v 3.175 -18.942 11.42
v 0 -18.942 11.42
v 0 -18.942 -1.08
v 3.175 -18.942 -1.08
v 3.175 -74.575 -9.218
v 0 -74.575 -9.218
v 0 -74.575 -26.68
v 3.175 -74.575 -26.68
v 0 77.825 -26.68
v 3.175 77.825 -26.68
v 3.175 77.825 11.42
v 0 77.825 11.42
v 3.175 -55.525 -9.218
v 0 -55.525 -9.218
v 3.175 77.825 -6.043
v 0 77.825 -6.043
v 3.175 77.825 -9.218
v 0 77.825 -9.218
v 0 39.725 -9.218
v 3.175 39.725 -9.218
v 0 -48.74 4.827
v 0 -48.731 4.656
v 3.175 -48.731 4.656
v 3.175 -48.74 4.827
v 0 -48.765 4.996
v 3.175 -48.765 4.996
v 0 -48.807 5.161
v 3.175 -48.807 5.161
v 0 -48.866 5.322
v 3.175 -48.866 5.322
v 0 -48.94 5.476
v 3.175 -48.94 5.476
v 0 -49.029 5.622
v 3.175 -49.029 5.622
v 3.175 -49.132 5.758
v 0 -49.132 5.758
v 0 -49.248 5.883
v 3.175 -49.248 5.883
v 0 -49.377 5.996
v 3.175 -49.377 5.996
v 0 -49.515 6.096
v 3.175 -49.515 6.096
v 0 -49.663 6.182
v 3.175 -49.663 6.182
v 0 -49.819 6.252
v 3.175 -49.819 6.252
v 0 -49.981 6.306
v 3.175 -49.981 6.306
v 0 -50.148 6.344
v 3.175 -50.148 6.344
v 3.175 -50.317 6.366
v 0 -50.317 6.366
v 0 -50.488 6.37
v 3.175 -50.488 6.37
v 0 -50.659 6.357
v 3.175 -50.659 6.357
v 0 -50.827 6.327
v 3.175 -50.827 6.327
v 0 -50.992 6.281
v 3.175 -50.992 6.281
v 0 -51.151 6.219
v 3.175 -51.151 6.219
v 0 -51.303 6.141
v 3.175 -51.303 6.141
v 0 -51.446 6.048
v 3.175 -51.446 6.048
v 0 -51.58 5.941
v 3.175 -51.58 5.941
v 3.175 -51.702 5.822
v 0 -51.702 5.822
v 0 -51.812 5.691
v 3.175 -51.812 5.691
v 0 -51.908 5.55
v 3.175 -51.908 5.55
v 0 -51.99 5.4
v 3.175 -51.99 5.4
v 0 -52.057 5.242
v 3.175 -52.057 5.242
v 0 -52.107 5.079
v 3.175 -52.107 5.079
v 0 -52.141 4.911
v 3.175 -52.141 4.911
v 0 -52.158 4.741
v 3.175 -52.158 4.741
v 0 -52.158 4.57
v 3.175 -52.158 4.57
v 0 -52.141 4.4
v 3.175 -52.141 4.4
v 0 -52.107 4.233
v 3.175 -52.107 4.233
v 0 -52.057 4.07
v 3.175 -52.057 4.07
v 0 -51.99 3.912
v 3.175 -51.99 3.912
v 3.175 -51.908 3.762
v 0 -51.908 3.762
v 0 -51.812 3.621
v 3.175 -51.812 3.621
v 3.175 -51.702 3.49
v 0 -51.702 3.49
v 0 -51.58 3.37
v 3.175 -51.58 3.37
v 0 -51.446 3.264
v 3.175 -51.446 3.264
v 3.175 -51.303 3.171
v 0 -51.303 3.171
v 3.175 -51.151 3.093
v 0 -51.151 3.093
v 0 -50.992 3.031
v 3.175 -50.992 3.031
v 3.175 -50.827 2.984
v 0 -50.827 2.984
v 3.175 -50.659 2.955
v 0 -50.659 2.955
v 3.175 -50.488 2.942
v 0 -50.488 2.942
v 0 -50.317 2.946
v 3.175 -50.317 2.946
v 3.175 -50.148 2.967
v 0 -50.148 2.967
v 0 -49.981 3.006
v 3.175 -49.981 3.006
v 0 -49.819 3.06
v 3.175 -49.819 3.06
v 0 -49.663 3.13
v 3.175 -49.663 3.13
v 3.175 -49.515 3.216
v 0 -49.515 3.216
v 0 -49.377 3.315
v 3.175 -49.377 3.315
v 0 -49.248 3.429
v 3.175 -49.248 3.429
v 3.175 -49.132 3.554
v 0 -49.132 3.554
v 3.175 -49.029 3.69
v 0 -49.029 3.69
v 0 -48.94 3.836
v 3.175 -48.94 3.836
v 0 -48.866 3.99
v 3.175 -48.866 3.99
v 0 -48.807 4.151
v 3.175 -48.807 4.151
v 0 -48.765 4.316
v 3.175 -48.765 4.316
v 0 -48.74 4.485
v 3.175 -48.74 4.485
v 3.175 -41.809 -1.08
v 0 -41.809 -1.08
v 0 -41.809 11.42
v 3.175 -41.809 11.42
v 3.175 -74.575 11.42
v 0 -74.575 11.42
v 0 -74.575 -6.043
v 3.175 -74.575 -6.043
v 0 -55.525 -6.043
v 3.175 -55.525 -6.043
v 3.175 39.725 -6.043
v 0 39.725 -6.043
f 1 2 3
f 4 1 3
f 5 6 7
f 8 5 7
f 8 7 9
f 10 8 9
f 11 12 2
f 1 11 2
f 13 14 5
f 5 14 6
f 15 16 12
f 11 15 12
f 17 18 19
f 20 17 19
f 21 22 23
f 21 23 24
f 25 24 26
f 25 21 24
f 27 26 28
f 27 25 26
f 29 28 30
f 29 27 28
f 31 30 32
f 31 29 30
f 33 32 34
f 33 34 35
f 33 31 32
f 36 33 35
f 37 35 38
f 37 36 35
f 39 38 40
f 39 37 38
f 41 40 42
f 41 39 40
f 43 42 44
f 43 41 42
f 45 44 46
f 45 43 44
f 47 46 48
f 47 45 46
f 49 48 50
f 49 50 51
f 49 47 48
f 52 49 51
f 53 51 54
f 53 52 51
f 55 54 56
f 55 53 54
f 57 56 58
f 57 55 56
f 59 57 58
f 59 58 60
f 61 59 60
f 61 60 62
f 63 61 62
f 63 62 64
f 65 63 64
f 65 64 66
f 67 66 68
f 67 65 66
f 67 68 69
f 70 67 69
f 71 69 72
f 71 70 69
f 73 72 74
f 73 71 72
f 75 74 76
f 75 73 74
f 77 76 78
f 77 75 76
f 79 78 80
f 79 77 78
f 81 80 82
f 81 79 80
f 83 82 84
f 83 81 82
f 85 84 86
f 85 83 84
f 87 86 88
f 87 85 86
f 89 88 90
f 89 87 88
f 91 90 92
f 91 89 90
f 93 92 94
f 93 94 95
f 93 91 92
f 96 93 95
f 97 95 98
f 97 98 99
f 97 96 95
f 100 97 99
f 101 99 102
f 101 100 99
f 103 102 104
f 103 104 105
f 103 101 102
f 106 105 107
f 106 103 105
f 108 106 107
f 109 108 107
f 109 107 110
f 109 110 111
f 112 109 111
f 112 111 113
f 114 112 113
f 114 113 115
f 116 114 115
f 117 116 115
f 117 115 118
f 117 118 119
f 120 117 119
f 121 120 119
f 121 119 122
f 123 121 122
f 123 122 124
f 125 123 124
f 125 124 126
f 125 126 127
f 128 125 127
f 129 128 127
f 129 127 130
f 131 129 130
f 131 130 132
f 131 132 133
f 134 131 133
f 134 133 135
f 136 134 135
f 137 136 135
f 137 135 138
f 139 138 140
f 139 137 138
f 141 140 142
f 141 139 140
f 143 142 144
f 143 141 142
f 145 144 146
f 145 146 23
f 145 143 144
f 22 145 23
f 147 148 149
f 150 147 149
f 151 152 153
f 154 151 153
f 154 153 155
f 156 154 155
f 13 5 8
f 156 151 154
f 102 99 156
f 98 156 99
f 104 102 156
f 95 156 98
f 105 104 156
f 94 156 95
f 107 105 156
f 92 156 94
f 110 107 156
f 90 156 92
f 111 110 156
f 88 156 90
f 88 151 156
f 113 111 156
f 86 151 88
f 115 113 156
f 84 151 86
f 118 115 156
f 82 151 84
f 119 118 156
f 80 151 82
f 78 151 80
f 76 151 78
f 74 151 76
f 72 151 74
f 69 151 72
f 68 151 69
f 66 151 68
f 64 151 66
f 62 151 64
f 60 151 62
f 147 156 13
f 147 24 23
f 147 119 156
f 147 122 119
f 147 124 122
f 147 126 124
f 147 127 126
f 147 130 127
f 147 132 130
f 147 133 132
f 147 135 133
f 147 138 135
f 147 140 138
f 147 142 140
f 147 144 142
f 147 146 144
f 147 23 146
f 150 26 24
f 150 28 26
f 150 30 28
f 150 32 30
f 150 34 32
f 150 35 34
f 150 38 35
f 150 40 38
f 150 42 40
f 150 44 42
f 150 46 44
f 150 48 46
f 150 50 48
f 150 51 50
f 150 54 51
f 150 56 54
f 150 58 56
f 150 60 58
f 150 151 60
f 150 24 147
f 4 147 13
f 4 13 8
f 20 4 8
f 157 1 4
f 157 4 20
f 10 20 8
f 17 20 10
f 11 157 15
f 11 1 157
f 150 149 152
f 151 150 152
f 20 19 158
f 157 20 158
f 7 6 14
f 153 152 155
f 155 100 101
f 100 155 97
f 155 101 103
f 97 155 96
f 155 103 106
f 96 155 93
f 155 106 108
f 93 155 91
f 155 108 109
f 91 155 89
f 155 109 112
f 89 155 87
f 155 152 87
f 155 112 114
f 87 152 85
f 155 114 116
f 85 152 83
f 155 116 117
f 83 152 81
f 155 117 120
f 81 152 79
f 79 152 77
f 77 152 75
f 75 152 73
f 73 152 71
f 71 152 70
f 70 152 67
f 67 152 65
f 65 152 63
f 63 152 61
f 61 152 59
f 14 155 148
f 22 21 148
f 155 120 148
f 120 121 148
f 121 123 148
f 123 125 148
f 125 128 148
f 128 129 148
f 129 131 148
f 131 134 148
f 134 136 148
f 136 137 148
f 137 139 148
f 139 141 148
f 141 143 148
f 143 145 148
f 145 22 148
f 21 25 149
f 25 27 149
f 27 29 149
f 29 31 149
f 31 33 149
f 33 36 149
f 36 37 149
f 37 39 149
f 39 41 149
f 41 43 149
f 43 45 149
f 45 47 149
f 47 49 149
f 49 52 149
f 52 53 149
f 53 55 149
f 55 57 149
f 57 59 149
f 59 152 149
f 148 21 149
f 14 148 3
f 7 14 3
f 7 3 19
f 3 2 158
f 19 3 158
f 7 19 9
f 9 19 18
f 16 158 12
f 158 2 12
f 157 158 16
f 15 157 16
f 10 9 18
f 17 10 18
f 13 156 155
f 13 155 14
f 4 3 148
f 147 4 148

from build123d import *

# Parameters (mm, degrees)
F0_R     = 1.7145
F1_DEPTH = 3.175


with BuildPart() as f1:
    # F0 (on Right) → F1 (new body)
    with BuildSketch(Plane.YZ):
        Polygon((-41.809275, 11.41993), (-74.575491, 11.41993), (-74.575491, -6.04257), (-55.525491, -6.04257), (-55.525491, -7.63007), (39.724509, -7.63007), (39.724509, -6.04257), (58.774509, -6.04257), (77.824509, -6.04257), (77.824509, 11.41993), (-18.942443, 11.41993), (-18.942443, -1.08007), (-41.809275, -1.08007), align=None)
        with Locations((-50.445491, 4.655921)):
            Circle(F0_R, mode=Mode.SUBTRACT)
        Polygon((-55.525491, -9.21757), (-74.575491, -9.21757), (-74.575491, -26.68007), (1.624509, -26.68007), (77.824509, -26.68007), (77.824509, -9.21757), (58.774509, -9.21757), (39.724509, -9.21757), (39.724509, -7.660097), (39.724509, -7.63007), (-55.525491, -7.63007), align=None)
    extrude(amount=F1_DEPTH)


solid = f1.part
